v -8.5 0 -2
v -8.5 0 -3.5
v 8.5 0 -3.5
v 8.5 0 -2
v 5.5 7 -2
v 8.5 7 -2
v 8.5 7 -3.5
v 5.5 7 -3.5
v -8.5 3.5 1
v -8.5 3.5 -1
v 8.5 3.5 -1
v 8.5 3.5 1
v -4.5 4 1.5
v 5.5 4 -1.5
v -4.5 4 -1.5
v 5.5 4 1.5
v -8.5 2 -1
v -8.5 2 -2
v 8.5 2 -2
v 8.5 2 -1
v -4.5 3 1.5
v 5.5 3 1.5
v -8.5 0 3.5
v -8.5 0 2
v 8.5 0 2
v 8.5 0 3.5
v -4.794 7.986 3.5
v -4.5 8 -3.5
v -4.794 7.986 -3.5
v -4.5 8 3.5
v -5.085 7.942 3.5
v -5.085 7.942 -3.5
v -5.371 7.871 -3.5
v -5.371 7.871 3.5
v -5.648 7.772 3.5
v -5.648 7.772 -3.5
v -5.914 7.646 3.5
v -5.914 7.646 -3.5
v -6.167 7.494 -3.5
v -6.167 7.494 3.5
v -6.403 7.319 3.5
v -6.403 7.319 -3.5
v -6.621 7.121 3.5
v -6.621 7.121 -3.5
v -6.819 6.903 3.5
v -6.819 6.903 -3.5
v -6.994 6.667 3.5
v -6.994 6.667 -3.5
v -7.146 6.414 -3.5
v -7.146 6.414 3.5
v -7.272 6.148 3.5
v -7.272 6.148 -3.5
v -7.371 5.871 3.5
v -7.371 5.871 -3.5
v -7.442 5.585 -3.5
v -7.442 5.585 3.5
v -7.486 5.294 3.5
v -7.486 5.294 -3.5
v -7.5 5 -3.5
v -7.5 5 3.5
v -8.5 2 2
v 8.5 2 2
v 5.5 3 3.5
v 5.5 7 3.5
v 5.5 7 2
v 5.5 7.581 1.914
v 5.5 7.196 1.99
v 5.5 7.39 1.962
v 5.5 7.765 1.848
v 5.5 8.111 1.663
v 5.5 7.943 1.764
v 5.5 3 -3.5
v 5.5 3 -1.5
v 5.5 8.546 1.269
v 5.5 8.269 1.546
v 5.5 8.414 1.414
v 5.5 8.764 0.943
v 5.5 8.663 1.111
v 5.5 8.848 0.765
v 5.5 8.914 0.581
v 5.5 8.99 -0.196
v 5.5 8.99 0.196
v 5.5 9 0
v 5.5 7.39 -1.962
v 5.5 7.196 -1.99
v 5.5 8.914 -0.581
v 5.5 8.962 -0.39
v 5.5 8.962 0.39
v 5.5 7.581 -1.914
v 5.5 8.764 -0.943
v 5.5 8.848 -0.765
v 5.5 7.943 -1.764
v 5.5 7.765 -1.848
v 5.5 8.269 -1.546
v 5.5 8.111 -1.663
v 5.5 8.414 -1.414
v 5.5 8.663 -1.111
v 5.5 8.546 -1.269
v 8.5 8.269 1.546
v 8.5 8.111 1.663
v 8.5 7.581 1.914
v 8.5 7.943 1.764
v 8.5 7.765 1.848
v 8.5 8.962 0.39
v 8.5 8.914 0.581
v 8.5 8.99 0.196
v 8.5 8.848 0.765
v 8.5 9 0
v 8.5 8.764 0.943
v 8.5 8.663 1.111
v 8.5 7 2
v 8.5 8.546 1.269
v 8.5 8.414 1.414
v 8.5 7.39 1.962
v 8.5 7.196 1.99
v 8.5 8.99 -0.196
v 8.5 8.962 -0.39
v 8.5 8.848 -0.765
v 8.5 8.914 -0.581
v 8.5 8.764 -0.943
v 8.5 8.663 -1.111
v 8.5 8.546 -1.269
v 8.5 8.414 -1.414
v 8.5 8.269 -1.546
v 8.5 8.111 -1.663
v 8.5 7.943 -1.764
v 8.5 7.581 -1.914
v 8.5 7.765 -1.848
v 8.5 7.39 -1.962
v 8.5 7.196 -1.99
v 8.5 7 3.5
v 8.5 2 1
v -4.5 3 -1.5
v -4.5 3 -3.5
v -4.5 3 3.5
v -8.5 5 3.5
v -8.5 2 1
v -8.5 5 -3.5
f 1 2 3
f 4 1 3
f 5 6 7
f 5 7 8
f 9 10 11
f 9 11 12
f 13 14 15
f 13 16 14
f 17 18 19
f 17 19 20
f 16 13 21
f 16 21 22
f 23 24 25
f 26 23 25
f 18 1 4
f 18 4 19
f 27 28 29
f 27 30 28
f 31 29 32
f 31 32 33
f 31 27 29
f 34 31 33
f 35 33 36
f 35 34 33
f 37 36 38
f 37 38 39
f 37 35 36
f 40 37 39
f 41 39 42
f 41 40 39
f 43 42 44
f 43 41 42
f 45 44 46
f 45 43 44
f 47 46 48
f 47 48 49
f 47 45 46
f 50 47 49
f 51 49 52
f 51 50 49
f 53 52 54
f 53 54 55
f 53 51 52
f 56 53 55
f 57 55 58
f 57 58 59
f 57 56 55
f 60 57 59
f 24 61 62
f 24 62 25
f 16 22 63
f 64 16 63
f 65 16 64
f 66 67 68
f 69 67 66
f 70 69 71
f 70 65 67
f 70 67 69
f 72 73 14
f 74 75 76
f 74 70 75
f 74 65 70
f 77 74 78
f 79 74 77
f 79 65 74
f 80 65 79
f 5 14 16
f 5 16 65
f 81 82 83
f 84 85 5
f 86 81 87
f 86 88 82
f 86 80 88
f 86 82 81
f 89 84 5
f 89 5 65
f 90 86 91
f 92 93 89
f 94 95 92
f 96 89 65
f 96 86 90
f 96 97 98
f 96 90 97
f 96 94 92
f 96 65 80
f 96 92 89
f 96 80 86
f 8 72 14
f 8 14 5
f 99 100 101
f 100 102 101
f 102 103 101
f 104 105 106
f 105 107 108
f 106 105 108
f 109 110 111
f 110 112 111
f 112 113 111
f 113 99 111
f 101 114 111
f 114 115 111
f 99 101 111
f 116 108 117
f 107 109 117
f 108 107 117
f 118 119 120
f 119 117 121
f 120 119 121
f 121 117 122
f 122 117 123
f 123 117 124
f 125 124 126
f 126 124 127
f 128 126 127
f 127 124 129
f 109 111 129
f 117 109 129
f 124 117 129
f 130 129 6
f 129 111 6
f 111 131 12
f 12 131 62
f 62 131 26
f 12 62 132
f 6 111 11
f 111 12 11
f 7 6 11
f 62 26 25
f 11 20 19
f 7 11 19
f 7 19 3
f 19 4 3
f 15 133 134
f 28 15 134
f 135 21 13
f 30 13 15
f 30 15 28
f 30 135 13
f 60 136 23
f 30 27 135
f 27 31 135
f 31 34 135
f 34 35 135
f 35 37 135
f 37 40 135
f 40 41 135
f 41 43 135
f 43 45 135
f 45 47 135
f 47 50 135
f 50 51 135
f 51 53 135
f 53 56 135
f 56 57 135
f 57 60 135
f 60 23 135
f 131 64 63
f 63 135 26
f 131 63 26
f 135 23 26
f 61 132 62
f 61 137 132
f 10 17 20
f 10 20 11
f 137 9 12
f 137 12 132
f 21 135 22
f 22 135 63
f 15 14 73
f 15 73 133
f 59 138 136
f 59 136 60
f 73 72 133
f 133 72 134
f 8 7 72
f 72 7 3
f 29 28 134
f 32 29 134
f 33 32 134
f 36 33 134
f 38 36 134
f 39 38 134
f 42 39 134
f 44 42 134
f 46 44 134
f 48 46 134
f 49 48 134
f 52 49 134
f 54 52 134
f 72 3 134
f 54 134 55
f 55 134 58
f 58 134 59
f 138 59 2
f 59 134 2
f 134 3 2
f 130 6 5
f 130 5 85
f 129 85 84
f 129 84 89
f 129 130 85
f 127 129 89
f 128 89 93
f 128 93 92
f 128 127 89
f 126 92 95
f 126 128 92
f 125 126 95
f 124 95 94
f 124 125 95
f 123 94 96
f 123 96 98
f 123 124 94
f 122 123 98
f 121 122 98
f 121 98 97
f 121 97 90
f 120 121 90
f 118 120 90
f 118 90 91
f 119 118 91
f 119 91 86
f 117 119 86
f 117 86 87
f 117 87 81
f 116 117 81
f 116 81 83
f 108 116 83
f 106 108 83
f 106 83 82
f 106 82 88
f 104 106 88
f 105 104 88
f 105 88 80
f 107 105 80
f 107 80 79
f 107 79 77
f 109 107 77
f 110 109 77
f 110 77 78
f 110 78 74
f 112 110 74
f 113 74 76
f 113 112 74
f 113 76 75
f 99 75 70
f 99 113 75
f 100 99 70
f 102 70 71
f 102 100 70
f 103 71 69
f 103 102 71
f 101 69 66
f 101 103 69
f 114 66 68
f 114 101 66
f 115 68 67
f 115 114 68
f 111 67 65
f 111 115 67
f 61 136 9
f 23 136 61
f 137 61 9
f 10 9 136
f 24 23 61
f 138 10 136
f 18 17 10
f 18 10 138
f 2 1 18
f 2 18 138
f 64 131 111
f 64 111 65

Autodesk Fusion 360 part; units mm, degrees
sketch "Sketch1" plane through (0, 0, 0) normal (1, 0, 0) x (0, 0, -1)
sketch "Sketch1 (2)" plane through (0, 0, 0) normal (0, 1, 0) x (1, 0, 0) in component "Component"
  line L0 (8.5, -3.5) -> (-8.5, -3.5)
  line L1 (-8.5, -3.5) -> (-8.5, 3.5)
  line L2 (-8.5, 3.5) -> (8.5, 3.5)
  line L3 (8.5, 3.5) -> (8.5, -3.5)
  line L4 (8.5, -3.5) -> (-8.5, 3.5) construction
  line L5 (-8.5, -3.5) -> (8.5, 3.5) construction
  dimension "d1" = 17
  dimension "d2" = 7
extrude "Extrude1" add sketch "Sketch1 (2)" along normal blind 5 in component "Component"
sketch "Sketch2" plane through (-8.5, 0, 0) normal (-1, 0, 0) x (0, 0, 1) in component "Component"
  line L0 (-3.5, 0) -> (3.5, 0)
  line L1 (3.5, 0) -> (3.5, 5)
  line L2 (3.5, 5) -> (-3.5, 5)
  line L3 (-3.5, 5) -> (-3.5, 0)
  line L4 (-2, 0) -> (-2, 2)
  line L5 (-2, 2) -> (-1, 2)
  line L6 (-1, 2) -> (-1, 3.5)
  line L7 (-1, 3.5) -> (1, 3.5)
  line L8 (1, 3.5) -> (1, 2)
  line L9 (1, 2) -> (2, 2)
  line L10 (2, 2) -> (2, 0)
extrude "Extrude2" cut sketch "Sketch2" against normal up to surface (17 mm away) contours L0 L4 L5 L6 L7 L8 L9 L10 in component "Component"
sketch "Sketch3" plane through (0, 0, 3.5) normal (0, 0, 1) x (1, 0, 0) in component "Component"
  line L0 (-8.5, 0) -> (8.5, 0)
  line L1 (8.5, 0) -> (8.5, 5)
  line L2 (8.5, 5) -> (-8.5, 5)
  line L3 (-8.5, 5) -> (-8.5, 0)
  circle A0 centre (-4.5, 5) radius 3
  line L4 (-4.5, 5) -> (-4.5, 8)
extrude "Extrude3" add sketch "Sketch3" against normal up to surface (7 mm away) contours L2 A0 L4 picked at (-5.6955, 6.597) in component "Component"
sketch "Sketch4" plane through (0, 5, 0) normal (0, 1, 0) x (-1, 0, 0) in component "Component"
  line L0 (4.5, -3.5) -> (4.5, 3.5)
  line L1 (4.5, 3.5) -> (-8.5, 3.5)
  line L2 (-8.5, 3.5) -> (-8.5, -3.5)
  line L3 (-8.5, -3.5) -> (4.5, -3.5)
  line L4 (-5.5, -3.5) -> (-5.5, 3.5)
extrude "Extrude4" add sketch "Sketch4" along normal blind 2 contours L1 L2 L3 L4 in component "Component"
sketch "Sketch5" plane through (8.5, 0, 0) normal (1, 0, 0) x (0, 0, -1) in component "Component"
  line L0 (-2, 0) -> (-2, 2)
  line L1 (-2, 2) -> (-1, 2)
  line L2 (-1, 2) -> (-1, 3.5)
  line L3 (-1, 3.5) -> (1, 3.5)
  line L4 (1, 3.5) -> (1, 2)
  line L5 (1, 2) -> (2, 2)
  line L6 (2, 2) -> (2, 0)
  line L7 (2, 0) -> (3.5, 0)
  line L8 (3.5, 0) -> (3.5, 7)
  line L9 (3.5, 7) -> (-3.5, 7)
  line L10 (-3.5, 7) -> (-3.5, 0)
  line L11 (-3.5, 0) -> (-2, 0)
  circle A0 centre (0, 7) radius 2
extrude "Extrude5" add sketch "Sketch5" against normal up to surface (3 mm away) contours L9 A0 picked at (0.4157, 7.5212) in component "Component"
sketch "Sketch6" plane through (0, 0, 3.5) normal (0, 0, 1) x (1, 0, 0) in component "Component"
  line L0 (-8.5, 0) -> (8.5, 0)
  line L1 (8.5, 0) -> (8.5, 7)
  line L2 (8.5, 7) -> (5.5, 7)
  line L3 (5.5, 7) -> (5.5, 5)
  line L4 (5.5, 5) -> (-4.5, 5)
  line L5 (-4.5, 5) -> (-4.5, 8)
  arc A0 (-4.5, 8) -> (-7.5, 5) centre (-4.5, 5) ccw
  line L6 (-7.5, 5) -> (-8.5, 5)
  line L7 (-8.5, 5) -> (-8.5, 0)
  line L8 (-4.5, 3) -> (5.5, 3)
  line L9 (5.5, 3) -> (5.5, 5)
  line L10 (-4.5, 3) -> (-4.5, 3.127)
  line L11 (-4.5, 3.127) -> (-4.5, 5)
extrude "Extrude6" cut sketch "Sketch6" against normal blind 2 contours L4 L8 L9 L10 L11 in component "Component"
sketch "Sketch7" plane through (0, 0, -3.5) normal (0, 0, -1) x (-1, 0, 0) in component "Component"
  line L0 (-8.5, 0) -> (8.5, 0)
  line L1 (8.5, 0) -> (8.5, 5)
  line L2 (8.5, 5) -> (7.5, 5)
  arc A0 (7.5, 5) -> (4.5, 8) centre (4.5, 5) ccw
  line L3 (4.5, 8) -> (4.5, 5)
  line L4 (4.5, 5) -> (-5.5, 5)
  line L5 (-5.5, 5) -> (-5.5, 7)
  line L6 (-5.5, 7) -> (-8.5, 7)
  line L7 (-8.5, 7) -> (-8.5, 0)
  line L8 (-5.5, 3) -> (4.5, 3)
  line L9 (4.5, 3) -> (4.5, 5)
  line L10 (-5.5, 3) -> (-5.5, 5)
extrude "Extrude7" cut sketch "Sketch7" against normal blind 2 contours L4 L8 L9 L10 in component "Component"
sketch "Sketch8" plane through (0, 5, 0) normal (0, 1, 0) x (-1, 0, 0) in component "Component"
  line L0 (-5.5, -1.5) -> (4.5, -1.5)
  line L1 (4.5, -1.5) -> (4.5, 1.5)
  line L2 (4.5, 1.5) -> (-5.5, 1.5)
  line L3 (-5.5, 1.5) -> (-5.5, -1.5)
extrude "Extrude8" cut sketch "Sketch8" against normal blind 1 in component "Component"
component "Component" placed x (1, 0, 0) y (0, 1, 0) z (0, 0, 1) at (0, 0, 0)
